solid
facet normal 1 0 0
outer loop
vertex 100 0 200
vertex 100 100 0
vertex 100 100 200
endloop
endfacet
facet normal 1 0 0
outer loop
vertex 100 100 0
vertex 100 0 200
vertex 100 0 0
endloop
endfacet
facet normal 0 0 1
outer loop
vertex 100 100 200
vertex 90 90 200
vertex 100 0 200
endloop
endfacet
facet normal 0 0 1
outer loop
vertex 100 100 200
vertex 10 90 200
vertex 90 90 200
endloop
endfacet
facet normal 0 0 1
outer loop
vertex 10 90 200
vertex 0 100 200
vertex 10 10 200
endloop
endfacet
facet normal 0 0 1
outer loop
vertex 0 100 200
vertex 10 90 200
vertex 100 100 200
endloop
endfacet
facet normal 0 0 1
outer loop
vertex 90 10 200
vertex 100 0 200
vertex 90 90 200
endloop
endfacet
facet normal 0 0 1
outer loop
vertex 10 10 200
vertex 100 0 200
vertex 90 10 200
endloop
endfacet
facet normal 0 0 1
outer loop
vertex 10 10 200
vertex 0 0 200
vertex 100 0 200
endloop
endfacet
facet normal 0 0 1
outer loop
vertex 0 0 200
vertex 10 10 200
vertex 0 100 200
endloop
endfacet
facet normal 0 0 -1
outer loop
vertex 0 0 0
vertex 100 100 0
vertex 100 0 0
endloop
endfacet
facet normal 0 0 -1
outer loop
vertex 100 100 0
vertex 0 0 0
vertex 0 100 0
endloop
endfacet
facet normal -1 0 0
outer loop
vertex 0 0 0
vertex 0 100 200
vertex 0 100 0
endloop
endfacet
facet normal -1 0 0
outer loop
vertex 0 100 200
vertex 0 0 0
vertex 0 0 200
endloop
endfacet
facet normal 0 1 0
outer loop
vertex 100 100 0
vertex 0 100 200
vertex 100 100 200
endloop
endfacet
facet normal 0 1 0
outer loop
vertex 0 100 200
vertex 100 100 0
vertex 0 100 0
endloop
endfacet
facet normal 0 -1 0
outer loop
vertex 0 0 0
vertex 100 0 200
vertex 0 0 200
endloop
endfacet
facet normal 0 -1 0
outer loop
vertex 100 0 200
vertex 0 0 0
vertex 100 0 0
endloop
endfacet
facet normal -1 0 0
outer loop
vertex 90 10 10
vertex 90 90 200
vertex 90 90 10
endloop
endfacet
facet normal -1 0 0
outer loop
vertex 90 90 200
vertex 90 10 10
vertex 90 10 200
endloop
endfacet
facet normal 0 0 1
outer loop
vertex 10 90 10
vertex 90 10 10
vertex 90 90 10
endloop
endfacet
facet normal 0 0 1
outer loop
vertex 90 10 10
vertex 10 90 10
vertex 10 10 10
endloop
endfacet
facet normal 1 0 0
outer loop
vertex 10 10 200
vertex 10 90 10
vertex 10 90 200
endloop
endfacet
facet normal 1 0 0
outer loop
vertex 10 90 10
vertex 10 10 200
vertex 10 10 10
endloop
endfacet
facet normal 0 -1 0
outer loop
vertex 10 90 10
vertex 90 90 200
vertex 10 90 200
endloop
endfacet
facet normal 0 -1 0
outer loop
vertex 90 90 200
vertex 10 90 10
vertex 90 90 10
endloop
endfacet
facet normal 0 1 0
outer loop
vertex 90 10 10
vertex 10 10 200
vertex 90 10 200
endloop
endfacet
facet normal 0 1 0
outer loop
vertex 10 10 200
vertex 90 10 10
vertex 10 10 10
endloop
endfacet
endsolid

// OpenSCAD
// Building dimensions
building_length = 100;
building_width = 100;
building_height = 200;
wall_thickness = 10;

// Window dimensions
window_length = 30;
window_width = 10;
window_height = 50;

// Create the main building structure
difference() {
    cube([building_length, building_width, building_height]); // Outer structure
    translate([wall_thickness, wall_thickness, wall_thickness]) {
        cube([building_length - 2*wall_thickness, building_width - 2*wall_thickness, building_height - wall_thickness]); // Inner cavity
    }
}

// Subtract windows from the building structure
difference() {
    // Building structure (from previous code block)
    difference() {
        cube([building_length, building_width, building_height]);
        translate([wall_thickness, wall_thickness, wall_thickness]) {
            cube([building_length - 2*wall_thickness, building_width - 2*wall_thickness, building_height - wall_thickness]);
        }
    }
    
    // Window openings
    translate([wall_thickness*2, 0, building_height/2]) {
        cube([window_length, window_width, window_height]); // Front window
    }
    translate([wall_thickness*2, building_width - window_width, building_height/2]) {
        cube([window_length, window_width, window_height]); // Back window
    }
}
